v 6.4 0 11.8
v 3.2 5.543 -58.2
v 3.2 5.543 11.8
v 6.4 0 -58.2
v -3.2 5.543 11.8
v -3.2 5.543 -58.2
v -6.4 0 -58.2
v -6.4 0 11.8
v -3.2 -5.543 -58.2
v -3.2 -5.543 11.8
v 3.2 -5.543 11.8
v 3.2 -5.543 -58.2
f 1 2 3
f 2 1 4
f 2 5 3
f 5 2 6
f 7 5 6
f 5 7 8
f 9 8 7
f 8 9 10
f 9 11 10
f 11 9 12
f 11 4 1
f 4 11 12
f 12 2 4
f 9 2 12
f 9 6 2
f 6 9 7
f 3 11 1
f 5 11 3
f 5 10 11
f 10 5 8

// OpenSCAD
function M8NutDiameter(3dPrinterTolerance=.4)= 12.4+3dPrinterTolerance;
function M8NutHeight(3dPrinterTolerance=.4)= 5.5+3dPrinterTolerance;

module M8Nut(3dPrinterTolerance=.4)
{
	cylinder(h=M8NutHeight(3dPrinterTolerance), r=M8NutDiameter(3dPrinterTolerance)/2, $fn=6);
}

//M8Nut();

module M8NutSlot(Length=50, 3dPrinterTolerance=.4)
{
	translate([0,0,-Length+M8NutHeight()*2])
	{
		cylinder(h=Length, r=M8NutDiameter(3dPrinterTolerance)/2, $fn=6);
	}
}

M8NutSlot(70);
